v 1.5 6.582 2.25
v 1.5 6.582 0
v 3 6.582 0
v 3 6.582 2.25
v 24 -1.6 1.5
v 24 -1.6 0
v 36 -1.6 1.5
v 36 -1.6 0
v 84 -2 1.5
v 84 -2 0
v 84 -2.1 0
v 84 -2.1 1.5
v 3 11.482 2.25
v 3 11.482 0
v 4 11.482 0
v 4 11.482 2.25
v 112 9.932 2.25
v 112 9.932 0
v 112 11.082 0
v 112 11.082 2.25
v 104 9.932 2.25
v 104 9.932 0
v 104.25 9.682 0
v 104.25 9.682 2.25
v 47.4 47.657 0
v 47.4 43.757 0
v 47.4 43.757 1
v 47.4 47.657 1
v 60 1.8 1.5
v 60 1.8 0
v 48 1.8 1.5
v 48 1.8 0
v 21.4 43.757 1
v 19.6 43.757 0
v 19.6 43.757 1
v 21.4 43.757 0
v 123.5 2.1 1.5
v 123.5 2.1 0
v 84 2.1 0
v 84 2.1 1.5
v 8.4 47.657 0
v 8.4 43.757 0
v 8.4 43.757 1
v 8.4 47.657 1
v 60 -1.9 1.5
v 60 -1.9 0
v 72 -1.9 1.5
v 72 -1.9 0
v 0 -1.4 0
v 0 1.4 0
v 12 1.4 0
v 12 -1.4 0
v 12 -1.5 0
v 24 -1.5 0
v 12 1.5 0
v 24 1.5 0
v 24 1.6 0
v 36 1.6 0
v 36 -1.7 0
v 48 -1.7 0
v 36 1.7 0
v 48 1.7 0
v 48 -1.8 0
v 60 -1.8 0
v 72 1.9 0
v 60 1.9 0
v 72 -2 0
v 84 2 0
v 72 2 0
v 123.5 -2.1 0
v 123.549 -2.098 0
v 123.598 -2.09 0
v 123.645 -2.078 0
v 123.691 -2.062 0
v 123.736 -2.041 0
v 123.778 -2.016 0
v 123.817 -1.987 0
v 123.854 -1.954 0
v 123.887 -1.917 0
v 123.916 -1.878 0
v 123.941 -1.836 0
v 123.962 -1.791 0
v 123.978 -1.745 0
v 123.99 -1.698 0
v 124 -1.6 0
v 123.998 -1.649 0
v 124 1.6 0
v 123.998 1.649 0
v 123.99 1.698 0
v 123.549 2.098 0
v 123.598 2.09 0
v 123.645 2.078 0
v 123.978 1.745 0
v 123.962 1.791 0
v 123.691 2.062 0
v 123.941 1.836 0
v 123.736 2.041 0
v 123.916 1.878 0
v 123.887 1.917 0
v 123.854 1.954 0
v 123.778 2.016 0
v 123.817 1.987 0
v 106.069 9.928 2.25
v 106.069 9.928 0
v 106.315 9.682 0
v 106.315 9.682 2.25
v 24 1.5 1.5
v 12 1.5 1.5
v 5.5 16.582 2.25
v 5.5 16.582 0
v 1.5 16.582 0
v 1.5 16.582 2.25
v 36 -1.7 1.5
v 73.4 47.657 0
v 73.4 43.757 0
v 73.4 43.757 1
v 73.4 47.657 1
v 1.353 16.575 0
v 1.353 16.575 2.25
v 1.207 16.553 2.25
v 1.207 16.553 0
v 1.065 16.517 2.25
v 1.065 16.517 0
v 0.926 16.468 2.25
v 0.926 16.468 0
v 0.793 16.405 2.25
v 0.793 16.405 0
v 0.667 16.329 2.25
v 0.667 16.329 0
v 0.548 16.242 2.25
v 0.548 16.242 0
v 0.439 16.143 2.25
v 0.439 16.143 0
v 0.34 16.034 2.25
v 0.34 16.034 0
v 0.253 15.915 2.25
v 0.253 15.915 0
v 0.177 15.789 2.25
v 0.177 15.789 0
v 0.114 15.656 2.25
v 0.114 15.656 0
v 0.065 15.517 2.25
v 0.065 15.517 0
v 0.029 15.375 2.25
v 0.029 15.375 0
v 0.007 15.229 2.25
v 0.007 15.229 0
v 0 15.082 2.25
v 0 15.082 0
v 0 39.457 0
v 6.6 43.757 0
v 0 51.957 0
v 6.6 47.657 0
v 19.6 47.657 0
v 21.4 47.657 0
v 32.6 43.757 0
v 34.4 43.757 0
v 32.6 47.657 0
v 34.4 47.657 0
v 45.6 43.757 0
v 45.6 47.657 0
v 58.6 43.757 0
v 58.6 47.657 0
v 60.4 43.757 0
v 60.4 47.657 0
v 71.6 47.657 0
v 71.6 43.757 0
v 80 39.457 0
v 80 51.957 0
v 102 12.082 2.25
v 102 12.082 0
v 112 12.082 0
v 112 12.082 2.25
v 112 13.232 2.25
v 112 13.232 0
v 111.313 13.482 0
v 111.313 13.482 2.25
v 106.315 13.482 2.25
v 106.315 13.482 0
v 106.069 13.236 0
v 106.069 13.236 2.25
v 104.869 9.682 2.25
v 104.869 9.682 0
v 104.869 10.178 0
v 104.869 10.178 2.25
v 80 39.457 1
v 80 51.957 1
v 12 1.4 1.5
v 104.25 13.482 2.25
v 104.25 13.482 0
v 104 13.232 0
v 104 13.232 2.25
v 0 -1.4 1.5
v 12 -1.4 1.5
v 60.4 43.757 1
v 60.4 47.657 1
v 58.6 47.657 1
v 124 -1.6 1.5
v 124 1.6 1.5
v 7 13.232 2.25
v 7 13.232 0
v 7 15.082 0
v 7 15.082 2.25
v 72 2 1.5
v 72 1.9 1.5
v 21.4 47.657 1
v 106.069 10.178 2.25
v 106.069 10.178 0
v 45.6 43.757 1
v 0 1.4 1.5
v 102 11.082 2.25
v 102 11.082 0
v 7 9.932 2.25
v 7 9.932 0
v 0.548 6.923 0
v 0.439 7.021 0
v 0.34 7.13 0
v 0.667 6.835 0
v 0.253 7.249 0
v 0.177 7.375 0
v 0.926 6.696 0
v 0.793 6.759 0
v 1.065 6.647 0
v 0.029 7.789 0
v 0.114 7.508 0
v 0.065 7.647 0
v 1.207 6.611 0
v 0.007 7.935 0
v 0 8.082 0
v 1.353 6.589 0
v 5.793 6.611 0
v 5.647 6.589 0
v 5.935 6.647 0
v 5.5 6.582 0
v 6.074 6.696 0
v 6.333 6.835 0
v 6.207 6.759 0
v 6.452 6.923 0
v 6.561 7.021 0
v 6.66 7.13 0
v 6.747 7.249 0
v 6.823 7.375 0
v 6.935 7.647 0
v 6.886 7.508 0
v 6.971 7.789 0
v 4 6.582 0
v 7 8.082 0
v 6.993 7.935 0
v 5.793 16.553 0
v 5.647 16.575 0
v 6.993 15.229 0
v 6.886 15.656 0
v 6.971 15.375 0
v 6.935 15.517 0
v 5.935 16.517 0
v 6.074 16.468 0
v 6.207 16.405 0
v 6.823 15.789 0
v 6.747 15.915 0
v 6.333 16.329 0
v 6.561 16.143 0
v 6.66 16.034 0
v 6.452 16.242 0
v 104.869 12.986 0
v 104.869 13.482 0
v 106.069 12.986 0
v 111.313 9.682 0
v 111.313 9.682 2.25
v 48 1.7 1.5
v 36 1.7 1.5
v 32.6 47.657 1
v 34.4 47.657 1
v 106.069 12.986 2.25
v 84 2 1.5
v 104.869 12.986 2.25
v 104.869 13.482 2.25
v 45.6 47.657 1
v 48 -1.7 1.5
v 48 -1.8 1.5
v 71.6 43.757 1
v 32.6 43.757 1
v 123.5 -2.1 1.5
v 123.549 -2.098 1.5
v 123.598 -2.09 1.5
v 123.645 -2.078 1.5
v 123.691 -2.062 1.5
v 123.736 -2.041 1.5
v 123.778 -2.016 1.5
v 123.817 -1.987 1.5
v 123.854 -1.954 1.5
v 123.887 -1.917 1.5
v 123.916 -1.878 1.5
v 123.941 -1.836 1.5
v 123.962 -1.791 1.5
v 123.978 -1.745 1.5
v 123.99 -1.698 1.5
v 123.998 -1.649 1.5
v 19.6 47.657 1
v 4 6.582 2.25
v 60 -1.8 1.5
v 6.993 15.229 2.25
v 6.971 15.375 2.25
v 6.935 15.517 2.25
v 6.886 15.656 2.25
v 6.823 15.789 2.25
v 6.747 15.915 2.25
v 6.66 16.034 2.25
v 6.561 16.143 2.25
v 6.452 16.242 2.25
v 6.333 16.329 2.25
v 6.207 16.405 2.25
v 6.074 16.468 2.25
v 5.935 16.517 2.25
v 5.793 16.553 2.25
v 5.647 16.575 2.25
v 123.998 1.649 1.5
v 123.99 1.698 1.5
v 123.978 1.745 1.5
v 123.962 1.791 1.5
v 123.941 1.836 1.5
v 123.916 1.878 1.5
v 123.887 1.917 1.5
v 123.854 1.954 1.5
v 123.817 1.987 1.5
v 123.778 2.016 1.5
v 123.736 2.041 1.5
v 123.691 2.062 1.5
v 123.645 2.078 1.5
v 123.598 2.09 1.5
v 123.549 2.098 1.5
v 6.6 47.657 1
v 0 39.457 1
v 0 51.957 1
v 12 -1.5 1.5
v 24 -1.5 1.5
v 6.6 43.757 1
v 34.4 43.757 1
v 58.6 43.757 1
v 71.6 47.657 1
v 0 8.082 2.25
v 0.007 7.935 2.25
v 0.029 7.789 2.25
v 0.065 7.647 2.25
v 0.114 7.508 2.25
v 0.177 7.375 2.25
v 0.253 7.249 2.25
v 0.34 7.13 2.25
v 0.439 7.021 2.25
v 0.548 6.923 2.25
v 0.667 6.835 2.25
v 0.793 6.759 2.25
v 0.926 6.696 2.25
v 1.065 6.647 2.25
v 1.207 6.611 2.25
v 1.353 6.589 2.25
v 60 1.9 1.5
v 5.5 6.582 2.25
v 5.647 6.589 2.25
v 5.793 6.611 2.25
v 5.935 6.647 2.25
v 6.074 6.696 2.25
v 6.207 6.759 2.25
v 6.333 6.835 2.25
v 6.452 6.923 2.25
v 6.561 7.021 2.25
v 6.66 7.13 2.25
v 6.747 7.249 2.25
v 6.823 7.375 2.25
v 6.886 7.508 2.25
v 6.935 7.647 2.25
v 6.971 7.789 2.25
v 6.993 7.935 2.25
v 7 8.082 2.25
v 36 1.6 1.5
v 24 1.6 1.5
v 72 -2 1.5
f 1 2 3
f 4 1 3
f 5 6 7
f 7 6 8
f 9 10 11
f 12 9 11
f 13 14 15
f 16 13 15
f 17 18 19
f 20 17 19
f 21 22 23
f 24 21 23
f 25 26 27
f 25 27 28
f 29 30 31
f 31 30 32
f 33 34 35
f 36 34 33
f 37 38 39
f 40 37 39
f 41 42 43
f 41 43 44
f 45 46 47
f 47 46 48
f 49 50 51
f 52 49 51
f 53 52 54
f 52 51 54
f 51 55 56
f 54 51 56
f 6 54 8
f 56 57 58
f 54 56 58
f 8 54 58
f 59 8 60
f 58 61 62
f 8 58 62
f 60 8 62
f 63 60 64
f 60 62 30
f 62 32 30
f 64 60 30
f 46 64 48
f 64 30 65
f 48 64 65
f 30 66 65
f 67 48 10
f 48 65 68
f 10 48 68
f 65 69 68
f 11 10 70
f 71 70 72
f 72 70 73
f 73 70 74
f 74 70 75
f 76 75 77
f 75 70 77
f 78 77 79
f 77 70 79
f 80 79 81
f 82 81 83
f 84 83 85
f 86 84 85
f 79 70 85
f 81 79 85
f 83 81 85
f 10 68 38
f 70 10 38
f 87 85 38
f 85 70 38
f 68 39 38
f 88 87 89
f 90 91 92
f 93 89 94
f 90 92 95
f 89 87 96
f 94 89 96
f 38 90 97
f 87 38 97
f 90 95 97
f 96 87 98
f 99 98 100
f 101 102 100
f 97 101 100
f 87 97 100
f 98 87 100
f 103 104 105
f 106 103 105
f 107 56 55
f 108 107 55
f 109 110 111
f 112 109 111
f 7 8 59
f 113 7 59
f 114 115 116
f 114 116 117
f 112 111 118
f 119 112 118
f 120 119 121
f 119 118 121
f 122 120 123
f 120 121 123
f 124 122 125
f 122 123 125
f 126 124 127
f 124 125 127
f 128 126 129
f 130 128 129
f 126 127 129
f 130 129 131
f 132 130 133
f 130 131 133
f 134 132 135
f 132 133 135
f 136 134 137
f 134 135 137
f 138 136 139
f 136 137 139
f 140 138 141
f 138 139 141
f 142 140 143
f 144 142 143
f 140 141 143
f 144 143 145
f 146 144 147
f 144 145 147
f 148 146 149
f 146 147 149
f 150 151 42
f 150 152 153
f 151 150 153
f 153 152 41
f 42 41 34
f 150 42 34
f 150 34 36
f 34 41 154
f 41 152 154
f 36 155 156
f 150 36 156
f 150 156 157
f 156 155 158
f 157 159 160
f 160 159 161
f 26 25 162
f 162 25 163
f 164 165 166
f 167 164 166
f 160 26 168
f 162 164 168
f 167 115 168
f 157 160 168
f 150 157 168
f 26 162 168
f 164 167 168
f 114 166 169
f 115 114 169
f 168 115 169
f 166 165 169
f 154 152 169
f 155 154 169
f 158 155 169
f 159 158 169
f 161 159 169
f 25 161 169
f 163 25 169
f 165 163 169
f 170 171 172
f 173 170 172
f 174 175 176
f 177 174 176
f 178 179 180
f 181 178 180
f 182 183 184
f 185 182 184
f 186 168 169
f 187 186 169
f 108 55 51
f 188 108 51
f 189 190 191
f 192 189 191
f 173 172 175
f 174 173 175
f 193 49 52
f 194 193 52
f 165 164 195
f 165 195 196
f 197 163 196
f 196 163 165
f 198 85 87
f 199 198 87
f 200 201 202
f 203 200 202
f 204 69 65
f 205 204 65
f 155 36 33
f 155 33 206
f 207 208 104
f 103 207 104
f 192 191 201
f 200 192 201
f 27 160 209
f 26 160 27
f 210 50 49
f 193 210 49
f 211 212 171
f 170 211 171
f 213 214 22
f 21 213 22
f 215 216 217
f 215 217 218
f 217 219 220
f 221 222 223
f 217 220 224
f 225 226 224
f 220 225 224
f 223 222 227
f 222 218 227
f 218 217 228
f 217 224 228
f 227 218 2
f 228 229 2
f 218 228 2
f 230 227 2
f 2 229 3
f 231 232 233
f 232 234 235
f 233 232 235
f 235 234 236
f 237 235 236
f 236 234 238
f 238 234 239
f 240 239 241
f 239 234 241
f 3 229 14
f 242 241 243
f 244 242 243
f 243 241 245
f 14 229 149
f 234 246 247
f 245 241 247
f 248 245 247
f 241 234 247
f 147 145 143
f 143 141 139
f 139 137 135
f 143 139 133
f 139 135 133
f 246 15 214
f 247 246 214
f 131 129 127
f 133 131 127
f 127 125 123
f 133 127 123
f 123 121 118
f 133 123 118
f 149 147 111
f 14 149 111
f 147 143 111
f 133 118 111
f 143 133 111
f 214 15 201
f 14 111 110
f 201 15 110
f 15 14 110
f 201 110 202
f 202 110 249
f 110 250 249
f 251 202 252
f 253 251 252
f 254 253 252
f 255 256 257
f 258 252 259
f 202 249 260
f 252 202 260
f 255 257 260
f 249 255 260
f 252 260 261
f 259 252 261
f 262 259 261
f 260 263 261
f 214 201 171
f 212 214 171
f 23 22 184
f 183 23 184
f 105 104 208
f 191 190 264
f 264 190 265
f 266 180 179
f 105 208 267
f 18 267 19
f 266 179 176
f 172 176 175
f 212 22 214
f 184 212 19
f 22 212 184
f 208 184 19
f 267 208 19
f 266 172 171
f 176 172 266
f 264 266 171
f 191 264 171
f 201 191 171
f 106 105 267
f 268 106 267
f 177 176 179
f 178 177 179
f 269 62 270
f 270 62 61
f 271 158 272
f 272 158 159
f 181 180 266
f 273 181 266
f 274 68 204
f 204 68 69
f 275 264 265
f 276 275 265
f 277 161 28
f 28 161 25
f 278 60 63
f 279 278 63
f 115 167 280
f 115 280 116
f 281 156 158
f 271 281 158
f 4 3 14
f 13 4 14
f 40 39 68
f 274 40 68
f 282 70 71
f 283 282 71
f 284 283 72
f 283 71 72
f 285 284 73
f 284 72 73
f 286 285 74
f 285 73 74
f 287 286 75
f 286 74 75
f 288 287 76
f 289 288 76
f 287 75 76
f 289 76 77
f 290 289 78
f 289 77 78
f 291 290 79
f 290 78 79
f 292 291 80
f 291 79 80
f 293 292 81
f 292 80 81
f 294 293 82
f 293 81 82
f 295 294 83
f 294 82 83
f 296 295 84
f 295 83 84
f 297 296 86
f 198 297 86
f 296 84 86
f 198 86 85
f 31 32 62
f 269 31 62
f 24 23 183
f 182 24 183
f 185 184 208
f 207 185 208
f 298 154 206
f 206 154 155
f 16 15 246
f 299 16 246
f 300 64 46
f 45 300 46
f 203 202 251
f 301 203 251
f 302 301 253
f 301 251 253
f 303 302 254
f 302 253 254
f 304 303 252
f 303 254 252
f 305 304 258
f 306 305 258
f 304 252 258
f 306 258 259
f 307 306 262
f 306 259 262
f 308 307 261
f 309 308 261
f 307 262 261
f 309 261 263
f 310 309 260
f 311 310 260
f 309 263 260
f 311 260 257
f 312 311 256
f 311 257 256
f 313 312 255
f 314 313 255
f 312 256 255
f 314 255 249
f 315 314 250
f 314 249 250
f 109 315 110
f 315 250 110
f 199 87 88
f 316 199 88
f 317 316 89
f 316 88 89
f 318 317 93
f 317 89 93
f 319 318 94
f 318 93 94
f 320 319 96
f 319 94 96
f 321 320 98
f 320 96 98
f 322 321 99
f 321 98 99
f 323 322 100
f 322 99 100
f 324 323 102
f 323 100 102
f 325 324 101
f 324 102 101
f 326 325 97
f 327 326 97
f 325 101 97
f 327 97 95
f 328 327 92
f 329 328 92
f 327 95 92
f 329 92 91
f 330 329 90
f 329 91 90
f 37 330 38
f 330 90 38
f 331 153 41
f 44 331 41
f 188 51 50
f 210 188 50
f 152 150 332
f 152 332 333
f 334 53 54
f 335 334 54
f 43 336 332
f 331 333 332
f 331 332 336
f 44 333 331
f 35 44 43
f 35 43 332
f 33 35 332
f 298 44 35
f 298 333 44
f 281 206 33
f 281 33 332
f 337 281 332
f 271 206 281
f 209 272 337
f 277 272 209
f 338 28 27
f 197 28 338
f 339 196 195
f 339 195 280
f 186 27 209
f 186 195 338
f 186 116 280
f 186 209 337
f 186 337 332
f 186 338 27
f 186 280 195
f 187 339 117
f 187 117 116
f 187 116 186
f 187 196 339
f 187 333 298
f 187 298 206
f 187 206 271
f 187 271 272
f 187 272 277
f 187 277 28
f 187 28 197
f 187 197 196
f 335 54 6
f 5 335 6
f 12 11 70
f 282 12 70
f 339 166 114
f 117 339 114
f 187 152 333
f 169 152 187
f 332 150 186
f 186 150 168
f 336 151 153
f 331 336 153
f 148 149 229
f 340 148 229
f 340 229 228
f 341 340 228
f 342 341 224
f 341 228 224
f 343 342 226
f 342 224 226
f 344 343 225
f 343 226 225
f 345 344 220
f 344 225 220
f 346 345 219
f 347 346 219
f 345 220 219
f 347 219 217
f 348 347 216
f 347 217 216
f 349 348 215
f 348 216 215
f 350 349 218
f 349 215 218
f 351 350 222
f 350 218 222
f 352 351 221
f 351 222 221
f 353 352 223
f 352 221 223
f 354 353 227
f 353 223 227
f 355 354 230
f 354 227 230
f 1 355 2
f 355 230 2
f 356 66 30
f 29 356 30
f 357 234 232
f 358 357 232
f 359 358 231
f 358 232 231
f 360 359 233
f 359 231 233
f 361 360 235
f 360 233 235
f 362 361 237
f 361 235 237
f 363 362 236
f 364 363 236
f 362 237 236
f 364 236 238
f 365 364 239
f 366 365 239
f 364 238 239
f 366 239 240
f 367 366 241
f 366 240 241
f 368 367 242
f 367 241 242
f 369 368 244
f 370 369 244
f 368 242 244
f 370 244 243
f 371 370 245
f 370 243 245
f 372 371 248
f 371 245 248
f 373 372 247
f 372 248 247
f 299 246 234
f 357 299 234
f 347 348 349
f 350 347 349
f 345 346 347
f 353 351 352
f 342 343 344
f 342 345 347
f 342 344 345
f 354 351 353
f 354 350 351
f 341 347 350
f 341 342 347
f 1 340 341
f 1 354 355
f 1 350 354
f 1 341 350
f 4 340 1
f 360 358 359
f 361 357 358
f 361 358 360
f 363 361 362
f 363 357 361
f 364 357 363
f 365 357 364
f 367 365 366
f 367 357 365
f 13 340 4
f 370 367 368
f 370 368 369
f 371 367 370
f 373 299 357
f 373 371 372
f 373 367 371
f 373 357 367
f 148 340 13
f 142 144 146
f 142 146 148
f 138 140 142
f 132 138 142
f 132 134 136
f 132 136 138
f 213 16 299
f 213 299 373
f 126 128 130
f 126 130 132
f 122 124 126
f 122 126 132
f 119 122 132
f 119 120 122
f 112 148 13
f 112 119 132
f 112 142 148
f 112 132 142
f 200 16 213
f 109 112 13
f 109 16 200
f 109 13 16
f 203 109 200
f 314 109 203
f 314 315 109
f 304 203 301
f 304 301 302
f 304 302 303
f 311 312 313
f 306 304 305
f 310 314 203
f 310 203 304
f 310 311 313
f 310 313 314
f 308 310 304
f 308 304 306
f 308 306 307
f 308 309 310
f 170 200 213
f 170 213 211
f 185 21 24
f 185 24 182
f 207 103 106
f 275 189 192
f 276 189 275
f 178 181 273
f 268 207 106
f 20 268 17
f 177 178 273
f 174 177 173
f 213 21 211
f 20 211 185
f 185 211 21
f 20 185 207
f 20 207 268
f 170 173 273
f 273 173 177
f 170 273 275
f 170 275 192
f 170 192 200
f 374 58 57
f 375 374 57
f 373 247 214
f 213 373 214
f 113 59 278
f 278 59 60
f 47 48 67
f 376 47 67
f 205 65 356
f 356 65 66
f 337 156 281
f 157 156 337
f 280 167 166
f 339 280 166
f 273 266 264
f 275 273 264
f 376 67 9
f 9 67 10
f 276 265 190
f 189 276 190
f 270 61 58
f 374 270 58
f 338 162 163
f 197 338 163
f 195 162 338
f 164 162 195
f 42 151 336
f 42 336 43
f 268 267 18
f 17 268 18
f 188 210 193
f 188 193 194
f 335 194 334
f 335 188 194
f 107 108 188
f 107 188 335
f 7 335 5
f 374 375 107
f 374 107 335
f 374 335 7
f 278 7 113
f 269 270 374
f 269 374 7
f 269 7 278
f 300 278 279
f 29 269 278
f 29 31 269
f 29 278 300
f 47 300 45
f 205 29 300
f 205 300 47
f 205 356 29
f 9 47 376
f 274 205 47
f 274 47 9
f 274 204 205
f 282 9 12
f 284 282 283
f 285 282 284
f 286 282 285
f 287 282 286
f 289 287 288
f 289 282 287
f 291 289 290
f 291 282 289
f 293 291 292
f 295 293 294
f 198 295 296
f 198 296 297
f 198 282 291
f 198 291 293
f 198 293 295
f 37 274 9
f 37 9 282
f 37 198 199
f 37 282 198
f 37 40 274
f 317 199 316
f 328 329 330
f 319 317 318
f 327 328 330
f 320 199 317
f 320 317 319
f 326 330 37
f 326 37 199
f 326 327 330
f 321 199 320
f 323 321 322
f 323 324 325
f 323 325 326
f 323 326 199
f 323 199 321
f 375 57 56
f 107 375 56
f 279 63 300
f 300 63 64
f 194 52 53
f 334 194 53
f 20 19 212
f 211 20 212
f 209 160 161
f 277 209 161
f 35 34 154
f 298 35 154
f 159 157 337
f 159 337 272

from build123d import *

# Parameters (mm, degrees)
F0_W     = 1
F0_H     = 1
F0_W_2   = 12
F0_W_3   = 8
F0_H_2   = 0.1
F1_DEPTH = 1.5
F2_DEPTH = 2.25
F3_W     = 80
F3_H     = 12.5
F3_W_2   = 1.8
F3_H_2   = 3.9
F4_DEPTH = 1


with BuildPart() as f1:
    # F0 (on Top) → F1 (new body)
    with BuildSketch(Plane.XY):
        with BuildLine():
            Line((0, 1.4), (0, 0))
            Line((0, 0), (0, -1.4))
            Line((0, -1.4), (12, -1.4))
            Line((12, -1.4), (12, -1.5))
            Line((12, -1.5), (24, -1.5))
            Line((24, -1.5), (24, -1.6))
            Line((24, -1.6), (36, -1.6))
            Line((36, -1.6), (36, -1.7))
            Line((36, -1.7), (48, -1.7))
            Line((48, -1.7), (48, -1.8))
            Line((48, -1.8), (60, -1.8))
            Line((60, -1.8), (60, -1.9))
            Line((60, -1.9), (72, -1.9))
            Line((72, -1.9), (72, -2))
            Line((72, -2), (84, -2))
            Line((84, -2), (84, -2.1))
            Line((84, -2.1), (123.5, -2.1))
            ThreePointArc((123.5, -2.1), (123.8535533906, -1.9535533906), (124, -1.6))
            Line((124, -1.6), (124, 0))
            Line((124, 0), (124, 1.6))
            ThreePointArc((124, 1.6), (123.8535533906, 1.9535533906), (123.5, 2.1))
            Line((123.5, 2.1), (84, 2.1))
            Line((84, 2.1), (84, 2))
            Line((84, 2), (72, 2))
            Line((72, 2), (72, 1.9))
            Line((72, 1.9), (60, 1.9))
            Line((60, 1.9), (60, 1.8))
            Line((60, 1.8), (48, 1.8))
            Line((48, 1.8), (48, 1.7))
            Line((48, 1.7), (36, 1.7))
            Line((36, 1.7), (36, 1.6))
            Line((36, 1.6), (24, 1.6))
            Line((24, 1.6), (24, 1.5))
            Line((24, 1.5), (12, 1.5))
            Line((12, 1.5), (12, 1.4))
            Line((12, 1.4), (0, 1.4))
        make_face()
        Polygon((61, -0.8), (49, -0.8), (49, -0.7), (17, -0.7), (17, -0.6), (16, -0.6), (16, -0.5), (4, -0.5), (4, 0.5), (16, 0.5), (16, 0.6), (17, 0.6), (17, 0.7), (49, 0.7), (49, 0.8), (61, 0.8), align=None, mode=Mode.SUBTRACT)
        Polygon((85, -1), (73, -1), (73, -0.9), (62, -0.9), (62, 0.9), (73, 0.9), (73, 1), (85, 1), align=None, mode=Mode.SUBTRACT)
        Polygon((123, -1.1), (86, -1.1), (86, 1.1), (123, 1.1), (123, 0.95), (123, 0.45), (123, -0.45), (123, -0.95), align=None, mode=Mode.SUBTRACT)
        with Locations((16.5, 0)):
            Rectangle(F0_W, F0_H)
        with Locations((10, 0)):
            Rectangle(F0_W_2, F0_H)
        with Locations((21, 0.55)):
            Rectangle(F0_W_3, F0_H_2)
        with Locations((21, -0.55)):
            Rectangle(F0_W_3, F0_H_2)
        with Locations((16.5, -0.55)):
            Rectangle(F0_W, F0_H_2)
        with Locations((16.5, 0.55)):
            Rectangle(F0_W, F0_H_2)
        Polygon((49, -0.7), (49, -0.8), (61, -0.8), (61, 0.8), (49, 0.8), (49, 0.7), (17, 0.7), (17, 0.6), (25, 0.6), (25, 0.5), (17, 0.5), (17, -0.5), (25, -0.5), (25, -0.6), (17, -0.6), (17, -0.7), align=None)
        Polygon((86, 1.1), (86, -1.1), (123, -1.1), (123, -0.95), (123, -0.45), (123, 0.45), (123, 0.95), (123, 1.1), align=None)
        Polygon((73, -0.9), (73, -1), (85, -1), (85, 1), (73, 1), (73, 0.9), (62, 0.9), (62, -0.9), align=None)
    extrude(amount=F1_DEPTH)


with BuildPart() as f1b:
    # F0 (on Top) → F1, piece 2 (new body)
    with BuildSketch(Plane.XY):
        with BuildLine():
            Line((0, 11.5820394844), (0, 8.0820394844))
            ThreePointArc((0, 8.0820394844), (0.4393398282, 7.0213793126), (1.5, 6.5820394844))
            Line((1.5, 6.5820394844), (3, 6.5820394844))
            Line((3, 6.5820394844), (3, 11.4820394844))
            Line((3, 11.4820394844), (4, 11.4820394844))
            Line((4, 11.4820394844), (4, 6.5820394844))
            Line((4, 6.5820394844), (5.5, 6.5820394844))
            ThreePointArc((5.5, 6.5820394844), (6.5606601718, 7.0213793126), (7, 8.0820394844))
            Line((7, 8.0820394844), (7, 9.9320394844))
            Line((7, 9.9320394844), (104, 9.9320394844))
            Line((104, 9.9320394844), (104.25, 9.6820394844))
            Line((104.25, 9.6820394844), (104.8692424178, 9.6820394844))
            Line((104.8692424178, 9.6820394844), (104.8692424178, 9.9280877039))
            Line((104.8692424178, 9.9280877039), (104.8692424178, 10.1780877039))
            Line((104.8692424178, 10.1780877039), (106.0692424178, 10.1780877039))
            Line((106.0692424178, 10.1780877039), (106.0692424178, 9.9280877039))
            Line((106.0692424178, 9.9280877039), (106.3152906373, 9.6820394844))
            Line((106.3152906373, 9.6820394844), (111.3131306451, 9.6820394844))
            Line((111.3131306451, 9.6820394844), (112, 9.9320394844))
            Line((112, 9.9320394844), (112, 11.0820394844))
            Line((112, 11.0820394844), (102, 11.0820394844))
            Line((102, 11.0820394844), (102, 11.5820394844))
            Line((102, 11.5820394844), (0, 11.5820394844))
        make_face()
    extrude(amount=F1_DEPTH)

    # F0 (on Top) → F2 (join)
    with BuildSketch(Plane.XY):
        with BuildLine():
            Line((0, 15.0820394844), (0, 11.5820394844))
            Line((0, 11.5820394844), (102, 11.5820394844))
            Line((102, 11.5820394844), (102, 12.0820394844))
            Line((102, 12.0820394844), (112, 12.0820394844))
            Line((112, 12.0820394844), (112, 13.2320394844))
            Line((112, 13.2320394844), (111.3131306451, 13.4820394844))
            Line((111.3131306451, 13.4820394844), (106.3152906373, 13.4820394844))
            Line((106.3152906373, 13.4820394844), (106.0692424178, 13.2359912649))
            Line((106.0692424178, 13.2359912649), (106.0692424178, 12.9859912649))
            Line((106.0692424178, 12.9859912649), (104.8692424178, 12.9859912649))
            Line((104.8692424178, 12.9859912649), (104.8692424178, 13.2359912649))
            Line((104.8692424178, 13.2359912649), (104.8692424178, 13.4820394844))
            Line((104.8692424178, 13.4820394844), (104.25, 13.4820394844))
            Line((104.25, 13.4820394844), (104, 13.2320394844))
            Line((104, 13.2320394844), (7, 13.2320394844))
            Line((7, 13.2320394844), (7, 15.0820394844))
            ThreePointArc((7, 15.0820394844), (6.5606601718, 16.1426996562), (5.5, 16.5820394844))
            Line((5.5, 16.5820394844), (1.5, 16.5820394844))
            ThreePointArc((1.5, 16.5820394844), (0.4393398282, 16.1426996562), (0, 15.0820394844))
        make_face()
        with BuildLine():
            Line((0, 11.5820394844), (0, 8.0820394844))
            ThreePointArc((0, 8.0820394844), (0.4393398282, 7.0213793126), (1.5, 6.5820394844))
            Line((1.5, 6.5820394844), (3, 6.5820394844))
            Line((3, 6.5820394844), (3, 11.4820394844))
            Line((3, 11.4820394844), (4, 11.4820394844))
            Line((4, 11.4820394844), (4, 6.5820394844))
            Line((4, 6.5820394844), (5.5, 6.5820394844))
            ThreePointArc((5.5, 6.5820394844), (6.5606601718, 7.0213793126), (7, 8.0820394844))
            Line((7, 8.0820394844), (7, 9.9320394844))
            Line((7, 9.9320394844), (104, 9.9320394844))
            Line((104, 9.9320394844), (104.25, 9.6820394844))
            Line((104.25, 9.6820394844), (104.8692424178, 9.6820394844))
            Line((104.8692424178, 9.6820394844), (104.8692424178, 9.9280877039))
            Line((104.8692424178, 9.9280877039), (104.8692424178, 10.1780877039))
            Line((104.8692424178, 10.1780877039), (106.0692424178, 10.1780877039))
            Line((106.0692424178, 10.1780877039), (106.0692424178, 9.9280877039))
            Line((106.0692424178, 9.9280877039), (106.3152906373, 9.6820394844))
            Line((106.3152906373, 9.6820394844), (111.3131306451, 9.6820394844))
            Line((111.3131306451, 9.6820394844), (112, 9.9320394844))
            Line((112, 9.9320394844), (112, 11.0820394844))
            Line((112, 11.0820394844), (102, 11.0820394844))
            Line((102, 11.0820394844), (102, 11.5820394844))
            Line((102, 11.5820394844), (0, 11.5820394844))
        make_face()
    extrude(amount=F2_DEPTH)


with BuildPart() as f4:
    # F3 (on Top) → F4 (new body)
    with BuildSketch(Plane.XY):
        with Locations((40, 45.7065304632)):
            Rectangle(F3_W, F3_H)
        with Locations((7.5, 45.7065304632)):
            Rectangle(F3_W_2, F3_H_2, mode=Mode.SUBTRACT)
        with Locations((20.5, 45.7065304632)):
            Rectangle(F3_W_2, F3_H_2, mode=Mode.SUBTRACT)
        with Locations((33.5, 45.7065304632)):
            Rectangle(F3_W_2, F3_H_2, mode=Mode.SUBTRACT)
        with Locations((46.5, 45.7065304632)):
            Rectangle(F3_W_2, F3_H_2, mode=Mode.SUBTRACT)
        with Locations((59.5, 45.7065304632)):
            Rectangle(F3_W_2, F3_H_2, mode=Mode.SUBTRACT)
        with Locations((72.5, 45.7065304632)):
            Rectangle(F3_W_2, F3_H_2, mode=Mode.SUBTRACT)
    extrude(amount=F4_DEPTH)


solid = Compound([f1.part, f1b.part, f4.part])
